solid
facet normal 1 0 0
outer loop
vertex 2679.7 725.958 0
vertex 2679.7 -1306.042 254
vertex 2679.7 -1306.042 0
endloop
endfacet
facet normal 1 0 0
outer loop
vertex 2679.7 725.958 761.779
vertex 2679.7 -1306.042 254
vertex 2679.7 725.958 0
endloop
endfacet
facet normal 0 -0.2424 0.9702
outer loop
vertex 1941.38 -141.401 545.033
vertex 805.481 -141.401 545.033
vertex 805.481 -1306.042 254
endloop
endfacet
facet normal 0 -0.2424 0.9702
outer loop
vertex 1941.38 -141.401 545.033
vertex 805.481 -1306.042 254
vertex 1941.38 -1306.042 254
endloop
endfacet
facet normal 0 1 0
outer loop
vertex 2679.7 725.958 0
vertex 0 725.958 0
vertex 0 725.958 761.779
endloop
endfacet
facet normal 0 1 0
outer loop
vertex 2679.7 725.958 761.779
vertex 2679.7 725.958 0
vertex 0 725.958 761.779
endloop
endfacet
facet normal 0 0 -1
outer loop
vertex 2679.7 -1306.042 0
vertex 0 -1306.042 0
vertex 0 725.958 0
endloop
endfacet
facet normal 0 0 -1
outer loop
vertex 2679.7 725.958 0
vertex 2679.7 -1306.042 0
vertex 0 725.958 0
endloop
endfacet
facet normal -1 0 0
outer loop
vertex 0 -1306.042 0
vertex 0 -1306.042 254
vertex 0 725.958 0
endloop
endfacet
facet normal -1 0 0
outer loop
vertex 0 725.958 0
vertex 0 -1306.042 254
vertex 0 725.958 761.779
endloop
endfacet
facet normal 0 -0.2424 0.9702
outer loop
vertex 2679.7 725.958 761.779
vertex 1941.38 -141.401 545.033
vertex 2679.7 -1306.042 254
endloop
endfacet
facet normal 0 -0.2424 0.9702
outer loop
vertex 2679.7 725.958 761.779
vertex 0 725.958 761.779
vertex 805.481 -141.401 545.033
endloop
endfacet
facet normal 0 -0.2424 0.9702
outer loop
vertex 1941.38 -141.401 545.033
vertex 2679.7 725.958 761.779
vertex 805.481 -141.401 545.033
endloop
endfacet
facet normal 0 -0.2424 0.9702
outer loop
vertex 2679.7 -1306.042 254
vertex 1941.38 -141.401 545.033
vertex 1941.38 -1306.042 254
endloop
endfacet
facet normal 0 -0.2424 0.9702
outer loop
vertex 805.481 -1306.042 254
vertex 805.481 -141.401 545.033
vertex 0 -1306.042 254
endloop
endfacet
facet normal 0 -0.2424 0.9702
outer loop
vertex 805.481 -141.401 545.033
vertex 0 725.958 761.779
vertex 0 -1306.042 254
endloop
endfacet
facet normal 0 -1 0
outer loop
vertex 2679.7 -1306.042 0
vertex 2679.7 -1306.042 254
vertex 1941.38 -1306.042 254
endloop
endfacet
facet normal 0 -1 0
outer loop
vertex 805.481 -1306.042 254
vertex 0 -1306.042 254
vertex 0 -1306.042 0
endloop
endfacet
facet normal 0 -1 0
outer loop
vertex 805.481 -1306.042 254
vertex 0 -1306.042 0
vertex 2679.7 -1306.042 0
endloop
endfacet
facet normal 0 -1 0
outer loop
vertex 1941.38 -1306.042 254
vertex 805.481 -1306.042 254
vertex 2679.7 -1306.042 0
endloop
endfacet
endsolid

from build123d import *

# Parameters (mm, degrees)
F1_DEPTH = 2679.7
F2_W     = 1135.899424
F2_H     = 1626.373622
F3_DEPTH = 254


with BuildPart() as f1:
    # F0 (on Right) → F1 (new body)
    with BuildSketch(Plane.YZ):
        Polygon((725.958003, 0), (725.958003, 761.778718), (-1306.041997, 254), (-1306.041997, 0), align=None)
    extrude(amount=F1_DEPTH)

    # F2 (on face) → F3 (join)
    with BuildSketch(Plane(origin=(0, -136.504751, 546.25695), x_dir=(1, 0, 0), z_dir=(0, -0.242436, 0.970167))):
        with Locations((1373.43055, -392.313705)):
            Rectangle(F2_W, F2_H)
    extrude(amount=-F3_DEPTH)


solid = f1.part
